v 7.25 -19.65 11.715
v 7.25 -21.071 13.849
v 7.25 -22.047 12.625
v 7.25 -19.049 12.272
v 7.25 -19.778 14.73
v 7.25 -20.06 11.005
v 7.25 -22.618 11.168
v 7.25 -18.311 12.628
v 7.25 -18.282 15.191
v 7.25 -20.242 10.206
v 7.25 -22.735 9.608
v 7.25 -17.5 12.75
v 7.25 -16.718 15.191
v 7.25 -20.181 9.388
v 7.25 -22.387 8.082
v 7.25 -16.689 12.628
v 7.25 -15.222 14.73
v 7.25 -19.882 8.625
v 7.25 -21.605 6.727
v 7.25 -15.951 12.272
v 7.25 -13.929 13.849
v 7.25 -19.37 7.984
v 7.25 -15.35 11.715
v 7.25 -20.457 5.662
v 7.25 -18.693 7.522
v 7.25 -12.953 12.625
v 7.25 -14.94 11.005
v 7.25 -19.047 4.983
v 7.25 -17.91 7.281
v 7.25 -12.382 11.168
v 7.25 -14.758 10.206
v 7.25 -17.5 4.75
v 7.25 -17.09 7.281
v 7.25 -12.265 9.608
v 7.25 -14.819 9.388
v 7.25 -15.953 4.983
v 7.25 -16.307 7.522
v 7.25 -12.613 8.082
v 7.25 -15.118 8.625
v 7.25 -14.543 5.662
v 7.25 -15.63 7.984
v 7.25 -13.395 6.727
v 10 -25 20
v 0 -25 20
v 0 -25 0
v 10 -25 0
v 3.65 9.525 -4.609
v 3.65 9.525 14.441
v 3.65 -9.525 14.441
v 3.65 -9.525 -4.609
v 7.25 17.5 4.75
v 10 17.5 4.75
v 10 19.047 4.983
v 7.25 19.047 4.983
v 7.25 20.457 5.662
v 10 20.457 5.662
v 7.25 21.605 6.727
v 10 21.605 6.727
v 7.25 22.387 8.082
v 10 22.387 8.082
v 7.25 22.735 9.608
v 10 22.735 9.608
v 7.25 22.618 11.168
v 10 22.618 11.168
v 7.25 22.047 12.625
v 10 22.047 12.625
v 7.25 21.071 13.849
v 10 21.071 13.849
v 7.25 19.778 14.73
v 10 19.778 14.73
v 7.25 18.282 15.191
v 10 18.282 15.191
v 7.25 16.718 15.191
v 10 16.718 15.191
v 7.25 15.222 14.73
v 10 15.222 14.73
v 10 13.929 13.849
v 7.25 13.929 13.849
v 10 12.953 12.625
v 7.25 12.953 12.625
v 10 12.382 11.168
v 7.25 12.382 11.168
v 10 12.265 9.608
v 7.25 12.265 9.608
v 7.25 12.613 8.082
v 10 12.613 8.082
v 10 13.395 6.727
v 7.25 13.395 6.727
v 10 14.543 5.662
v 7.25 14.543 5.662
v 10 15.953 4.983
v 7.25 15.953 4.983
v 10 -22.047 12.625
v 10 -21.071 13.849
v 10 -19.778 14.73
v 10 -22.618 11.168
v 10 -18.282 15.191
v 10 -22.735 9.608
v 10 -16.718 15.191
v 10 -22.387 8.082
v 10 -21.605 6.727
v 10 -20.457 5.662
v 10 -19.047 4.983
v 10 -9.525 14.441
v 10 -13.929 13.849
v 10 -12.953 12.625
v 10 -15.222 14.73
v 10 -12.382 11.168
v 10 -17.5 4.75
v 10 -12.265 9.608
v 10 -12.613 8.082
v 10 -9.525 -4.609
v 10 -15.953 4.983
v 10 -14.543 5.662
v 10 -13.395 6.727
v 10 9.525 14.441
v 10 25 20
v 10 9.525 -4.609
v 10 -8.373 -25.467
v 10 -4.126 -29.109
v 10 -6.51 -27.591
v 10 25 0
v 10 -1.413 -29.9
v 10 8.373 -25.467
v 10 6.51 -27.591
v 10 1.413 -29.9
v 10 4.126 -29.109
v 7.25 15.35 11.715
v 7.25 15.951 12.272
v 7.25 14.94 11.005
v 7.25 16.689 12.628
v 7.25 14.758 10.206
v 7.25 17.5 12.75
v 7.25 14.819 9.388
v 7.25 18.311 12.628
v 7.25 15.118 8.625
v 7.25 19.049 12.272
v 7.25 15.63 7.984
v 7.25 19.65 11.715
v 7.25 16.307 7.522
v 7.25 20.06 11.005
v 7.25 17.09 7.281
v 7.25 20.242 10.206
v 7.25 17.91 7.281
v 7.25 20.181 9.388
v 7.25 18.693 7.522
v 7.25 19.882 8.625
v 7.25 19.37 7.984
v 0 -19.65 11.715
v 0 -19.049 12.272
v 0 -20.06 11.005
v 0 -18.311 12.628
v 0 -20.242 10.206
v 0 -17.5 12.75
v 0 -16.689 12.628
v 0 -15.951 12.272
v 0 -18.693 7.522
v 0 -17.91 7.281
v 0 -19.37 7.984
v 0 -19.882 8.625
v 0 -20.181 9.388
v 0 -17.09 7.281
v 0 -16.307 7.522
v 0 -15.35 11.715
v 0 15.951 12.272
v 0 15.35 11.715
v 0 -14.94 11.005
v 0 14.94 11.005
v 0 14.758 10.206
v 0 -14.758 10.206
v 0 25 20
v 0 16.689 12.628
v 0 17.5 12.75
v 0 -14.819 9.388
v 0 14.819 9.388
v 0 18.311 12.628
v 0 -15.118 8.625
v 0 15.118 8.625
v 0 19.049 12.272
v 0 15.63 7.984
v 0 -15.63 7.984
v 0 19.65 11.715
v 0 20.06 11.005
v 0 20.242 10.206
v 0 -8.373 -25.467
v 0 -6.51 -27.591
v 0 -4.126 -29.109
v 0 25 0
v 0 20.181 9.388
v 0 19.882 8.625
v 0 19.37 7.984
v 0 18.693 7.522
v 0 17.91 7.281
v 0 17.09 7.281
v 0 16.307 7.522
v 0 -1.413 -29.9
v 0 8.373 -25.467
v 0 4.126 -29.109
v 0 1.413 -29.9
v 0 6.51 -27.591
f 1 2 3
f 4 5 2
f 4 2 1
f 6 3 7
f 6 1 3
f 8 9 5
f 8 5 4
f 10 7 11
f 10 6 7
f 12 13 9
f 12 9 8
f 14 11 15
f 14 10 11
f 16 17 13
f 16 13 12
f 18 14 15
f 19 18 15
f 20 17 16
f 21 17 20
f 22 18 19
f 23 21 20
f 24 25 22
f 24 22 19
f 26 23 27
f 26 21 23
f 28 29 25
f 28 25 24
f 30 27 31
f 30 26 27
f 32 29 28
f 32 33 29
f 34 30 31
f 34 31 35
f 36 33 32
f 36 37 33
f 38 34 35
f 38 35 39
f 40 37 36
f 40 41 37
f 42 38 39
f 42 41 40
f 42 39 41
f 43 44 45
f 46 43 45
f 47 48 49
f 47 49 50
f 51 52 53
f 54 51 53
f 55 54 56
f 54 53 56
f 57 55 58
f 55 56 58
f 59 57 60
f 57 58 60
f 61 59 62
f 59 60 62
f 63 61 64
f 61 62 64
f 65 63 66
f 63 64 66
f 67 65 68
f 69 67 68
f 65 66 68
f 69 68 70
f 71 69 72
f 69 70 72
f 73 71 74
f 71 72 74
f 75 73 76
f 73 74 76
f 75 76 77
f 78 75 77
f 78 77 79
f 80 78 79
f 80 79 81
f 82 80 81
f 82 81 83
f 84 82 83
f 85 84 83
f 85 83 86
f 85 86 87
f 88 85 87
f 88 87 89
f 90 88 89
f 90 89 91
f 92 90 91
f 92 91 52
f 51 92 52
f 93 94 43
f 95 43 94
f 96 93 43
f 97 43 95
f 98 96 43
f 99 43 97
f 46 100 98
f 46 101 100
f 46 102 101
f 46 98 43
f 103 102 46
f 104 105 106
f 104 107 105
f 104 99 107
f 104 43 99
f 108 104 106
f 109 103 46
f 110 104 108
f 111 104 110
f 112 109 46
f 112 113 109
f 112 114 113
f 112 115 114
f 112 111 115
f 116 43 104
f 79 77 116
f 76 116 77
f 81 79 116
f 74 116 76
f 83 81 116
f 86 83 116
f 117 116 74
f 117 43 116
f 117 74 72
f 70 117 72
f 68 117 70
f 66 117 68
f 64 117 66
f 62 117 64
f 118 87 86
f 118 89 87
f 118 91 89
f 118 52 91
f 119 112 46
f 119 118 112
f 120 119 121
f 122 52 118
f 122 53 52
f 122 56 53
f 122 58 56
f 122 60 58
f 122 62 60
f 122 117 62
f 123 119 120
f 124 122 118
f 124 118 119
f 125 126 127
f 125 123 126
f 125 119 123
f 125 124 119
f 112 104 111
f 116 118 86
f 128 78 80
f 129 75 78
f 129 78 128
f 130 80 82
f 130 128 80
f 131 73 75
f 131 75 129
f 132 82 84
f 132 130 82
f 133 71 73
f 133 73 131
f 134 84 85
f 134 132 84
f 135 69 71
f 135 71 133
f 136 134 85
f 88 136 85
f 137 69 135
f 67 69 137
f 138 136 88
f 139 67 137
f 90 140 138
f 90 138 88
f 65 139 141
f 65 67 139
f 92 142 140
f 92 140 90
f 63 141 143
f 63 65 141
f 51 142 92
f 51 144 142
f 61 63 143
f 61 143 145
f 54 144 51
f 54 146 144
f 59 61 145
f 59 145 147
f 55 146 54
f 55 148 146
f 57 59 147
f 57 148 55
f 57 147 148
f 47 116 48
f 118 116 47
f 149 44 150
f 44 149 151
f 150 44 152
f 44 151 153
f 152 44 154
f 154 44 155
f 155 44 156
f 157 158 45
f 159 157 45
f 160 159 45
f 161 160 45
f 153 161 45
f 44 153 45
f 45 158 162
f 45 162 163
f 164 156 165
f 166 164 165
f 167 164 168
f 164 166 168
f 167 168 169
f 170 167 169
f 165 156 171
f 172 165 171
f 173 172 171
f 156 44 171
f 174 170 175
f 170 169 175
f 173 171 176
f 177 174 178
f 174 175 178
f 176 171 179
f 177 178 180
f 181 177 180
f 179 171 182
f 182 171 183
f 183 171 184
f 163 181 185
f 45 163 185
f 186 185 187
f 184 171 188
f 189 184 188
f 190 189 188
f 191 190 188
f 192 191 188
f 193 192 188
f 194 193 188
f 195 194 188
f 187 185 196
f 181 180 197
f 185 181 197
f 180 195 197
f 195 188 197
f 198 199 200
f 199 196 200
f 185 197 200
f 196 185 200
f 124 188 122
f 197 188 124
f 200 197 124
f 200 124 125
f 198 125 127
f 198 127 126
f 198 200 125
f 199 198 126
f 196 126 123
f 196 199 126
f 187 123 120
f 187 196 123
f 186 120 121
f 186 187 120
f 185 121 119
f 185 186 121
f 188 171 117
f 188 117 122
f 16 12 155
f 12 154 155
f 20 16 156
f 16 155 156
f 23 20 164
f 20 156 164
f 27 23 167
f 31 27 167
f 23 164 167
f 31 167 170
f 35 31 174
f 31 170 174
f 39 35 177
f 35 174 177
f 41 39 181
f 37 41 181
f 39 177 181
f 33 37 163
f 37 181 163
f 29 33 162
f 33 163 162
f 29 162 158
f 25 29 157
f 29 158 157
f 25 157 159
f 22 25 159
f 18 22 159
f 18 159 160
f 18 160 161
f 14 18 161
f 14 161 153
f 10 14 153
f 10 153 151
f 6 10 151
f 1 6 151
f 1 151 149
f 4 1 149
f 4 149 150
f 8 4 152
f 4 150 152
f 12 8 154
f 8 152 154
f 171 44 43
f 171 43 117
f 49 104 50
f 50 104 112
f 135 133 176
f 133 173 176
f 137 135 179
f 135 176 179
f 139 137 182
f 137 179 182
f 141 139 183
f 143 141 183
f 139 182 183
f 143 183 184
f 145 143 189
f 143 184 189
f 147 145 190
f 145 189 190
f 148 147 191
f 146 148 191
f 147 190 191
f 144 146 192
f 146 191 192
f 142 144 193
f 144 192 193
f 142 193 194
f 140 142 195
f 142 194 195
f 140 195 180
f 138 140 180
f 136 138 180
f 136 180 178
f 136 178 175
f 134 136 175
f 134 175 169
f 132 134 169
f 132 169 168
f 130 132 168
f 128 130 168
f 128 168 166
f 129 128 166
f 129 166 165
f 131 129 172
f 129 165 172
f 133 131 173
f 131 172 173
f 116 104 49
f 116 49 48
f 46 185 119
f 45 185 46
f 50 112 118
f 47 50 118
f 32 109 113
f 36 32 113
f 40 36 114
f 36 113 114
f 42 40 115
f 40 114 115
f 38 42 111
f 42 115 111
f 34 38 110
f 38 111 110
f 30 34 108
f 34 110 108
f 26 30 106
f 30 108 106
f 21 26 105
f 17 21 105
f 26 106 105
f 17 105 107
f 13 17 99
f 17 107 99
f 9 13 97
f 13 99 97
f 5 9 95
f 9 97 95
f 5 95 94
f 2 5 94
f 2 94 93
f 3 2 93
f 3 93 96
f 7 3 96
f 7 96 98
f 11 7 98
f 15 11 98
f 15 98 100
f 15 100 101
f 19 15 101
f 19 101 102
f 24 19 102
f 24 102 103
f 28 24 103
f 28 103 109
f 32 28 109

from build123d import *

# Parameters (mm, degrees)
SKETCH1_W                       = 20
SKETCH1_H                       = 50
BOSS_EXTRUDE1_DEPTH             = 10
CBORE_FOR_M5_SBHCS1_D           = 5.5
CBORE_FOR_M5_SBHCS1_CBORE_D     = 10.5
CBORE_FOR_M5_SBHCS1_CBORE_DEPTH = 2.75
SKETCH5_W                       = 19.05
SKETCH5_H                       = 19.05
CUT_EXTRUDE1_DEPTH              = 6.35


with BuildPart() as part:
    # Sketch1 → Boss-Extrude1 (new body)
    with BuildSketch(Plane(origin=(0, 0, 0), x_dir=(0, 0, -1), z_dir=(1, 0, 0))):
        with Locations((-10, 0)):
            Rectangle(SKETCH1_W, SKETCH1_H)
        with BuildLine():
            ThreePointArc((25.466783574, 8.373426859), (30, 0), (25.466783574, -8.373426859))
            Line((25.466783574, -8.373426859), (0, -25))
            Line((0, -25), (0, 25))
            Line((0, 25), (25.466783574, 8.373426859))
        make_face()
    extrude(amount=BOSS_EXTRUDE1_DEPTH)

    # CBORE for M5 SBHCS1 (through all)
    with Locations(Plane(origin=(10, 0, 0), x_dir=(0, 0, -1), z_dir=(1, 0, 0))):
        with Locations((-10, 17.5), (-10, -17.5)):
            CounterBoreHole(CBORE_FOR_M5_SBHCS1_D / 2, CBORE_FOR_M5_SBHCS1_CBORE_D / 2, CBORE_FOR_M5_SBHCS1_CBORE_DEPTH)

    # Sketch5 → Cut-Extrude1 (cut)
    with BuildSketch(Plane(origin=(10, 0, 0), x_dir=(0, 0, -1), z_dir=(1, 0, 0))):
        with Locations((-4.915565879, 0)):
            Rectangle(SKETCH5_W, SKETCH5_H)
    extrude(amount=-CUT_EXTRUDE1_DEPTH, mode=Mode.SUBTRACT)


solid = part.part
